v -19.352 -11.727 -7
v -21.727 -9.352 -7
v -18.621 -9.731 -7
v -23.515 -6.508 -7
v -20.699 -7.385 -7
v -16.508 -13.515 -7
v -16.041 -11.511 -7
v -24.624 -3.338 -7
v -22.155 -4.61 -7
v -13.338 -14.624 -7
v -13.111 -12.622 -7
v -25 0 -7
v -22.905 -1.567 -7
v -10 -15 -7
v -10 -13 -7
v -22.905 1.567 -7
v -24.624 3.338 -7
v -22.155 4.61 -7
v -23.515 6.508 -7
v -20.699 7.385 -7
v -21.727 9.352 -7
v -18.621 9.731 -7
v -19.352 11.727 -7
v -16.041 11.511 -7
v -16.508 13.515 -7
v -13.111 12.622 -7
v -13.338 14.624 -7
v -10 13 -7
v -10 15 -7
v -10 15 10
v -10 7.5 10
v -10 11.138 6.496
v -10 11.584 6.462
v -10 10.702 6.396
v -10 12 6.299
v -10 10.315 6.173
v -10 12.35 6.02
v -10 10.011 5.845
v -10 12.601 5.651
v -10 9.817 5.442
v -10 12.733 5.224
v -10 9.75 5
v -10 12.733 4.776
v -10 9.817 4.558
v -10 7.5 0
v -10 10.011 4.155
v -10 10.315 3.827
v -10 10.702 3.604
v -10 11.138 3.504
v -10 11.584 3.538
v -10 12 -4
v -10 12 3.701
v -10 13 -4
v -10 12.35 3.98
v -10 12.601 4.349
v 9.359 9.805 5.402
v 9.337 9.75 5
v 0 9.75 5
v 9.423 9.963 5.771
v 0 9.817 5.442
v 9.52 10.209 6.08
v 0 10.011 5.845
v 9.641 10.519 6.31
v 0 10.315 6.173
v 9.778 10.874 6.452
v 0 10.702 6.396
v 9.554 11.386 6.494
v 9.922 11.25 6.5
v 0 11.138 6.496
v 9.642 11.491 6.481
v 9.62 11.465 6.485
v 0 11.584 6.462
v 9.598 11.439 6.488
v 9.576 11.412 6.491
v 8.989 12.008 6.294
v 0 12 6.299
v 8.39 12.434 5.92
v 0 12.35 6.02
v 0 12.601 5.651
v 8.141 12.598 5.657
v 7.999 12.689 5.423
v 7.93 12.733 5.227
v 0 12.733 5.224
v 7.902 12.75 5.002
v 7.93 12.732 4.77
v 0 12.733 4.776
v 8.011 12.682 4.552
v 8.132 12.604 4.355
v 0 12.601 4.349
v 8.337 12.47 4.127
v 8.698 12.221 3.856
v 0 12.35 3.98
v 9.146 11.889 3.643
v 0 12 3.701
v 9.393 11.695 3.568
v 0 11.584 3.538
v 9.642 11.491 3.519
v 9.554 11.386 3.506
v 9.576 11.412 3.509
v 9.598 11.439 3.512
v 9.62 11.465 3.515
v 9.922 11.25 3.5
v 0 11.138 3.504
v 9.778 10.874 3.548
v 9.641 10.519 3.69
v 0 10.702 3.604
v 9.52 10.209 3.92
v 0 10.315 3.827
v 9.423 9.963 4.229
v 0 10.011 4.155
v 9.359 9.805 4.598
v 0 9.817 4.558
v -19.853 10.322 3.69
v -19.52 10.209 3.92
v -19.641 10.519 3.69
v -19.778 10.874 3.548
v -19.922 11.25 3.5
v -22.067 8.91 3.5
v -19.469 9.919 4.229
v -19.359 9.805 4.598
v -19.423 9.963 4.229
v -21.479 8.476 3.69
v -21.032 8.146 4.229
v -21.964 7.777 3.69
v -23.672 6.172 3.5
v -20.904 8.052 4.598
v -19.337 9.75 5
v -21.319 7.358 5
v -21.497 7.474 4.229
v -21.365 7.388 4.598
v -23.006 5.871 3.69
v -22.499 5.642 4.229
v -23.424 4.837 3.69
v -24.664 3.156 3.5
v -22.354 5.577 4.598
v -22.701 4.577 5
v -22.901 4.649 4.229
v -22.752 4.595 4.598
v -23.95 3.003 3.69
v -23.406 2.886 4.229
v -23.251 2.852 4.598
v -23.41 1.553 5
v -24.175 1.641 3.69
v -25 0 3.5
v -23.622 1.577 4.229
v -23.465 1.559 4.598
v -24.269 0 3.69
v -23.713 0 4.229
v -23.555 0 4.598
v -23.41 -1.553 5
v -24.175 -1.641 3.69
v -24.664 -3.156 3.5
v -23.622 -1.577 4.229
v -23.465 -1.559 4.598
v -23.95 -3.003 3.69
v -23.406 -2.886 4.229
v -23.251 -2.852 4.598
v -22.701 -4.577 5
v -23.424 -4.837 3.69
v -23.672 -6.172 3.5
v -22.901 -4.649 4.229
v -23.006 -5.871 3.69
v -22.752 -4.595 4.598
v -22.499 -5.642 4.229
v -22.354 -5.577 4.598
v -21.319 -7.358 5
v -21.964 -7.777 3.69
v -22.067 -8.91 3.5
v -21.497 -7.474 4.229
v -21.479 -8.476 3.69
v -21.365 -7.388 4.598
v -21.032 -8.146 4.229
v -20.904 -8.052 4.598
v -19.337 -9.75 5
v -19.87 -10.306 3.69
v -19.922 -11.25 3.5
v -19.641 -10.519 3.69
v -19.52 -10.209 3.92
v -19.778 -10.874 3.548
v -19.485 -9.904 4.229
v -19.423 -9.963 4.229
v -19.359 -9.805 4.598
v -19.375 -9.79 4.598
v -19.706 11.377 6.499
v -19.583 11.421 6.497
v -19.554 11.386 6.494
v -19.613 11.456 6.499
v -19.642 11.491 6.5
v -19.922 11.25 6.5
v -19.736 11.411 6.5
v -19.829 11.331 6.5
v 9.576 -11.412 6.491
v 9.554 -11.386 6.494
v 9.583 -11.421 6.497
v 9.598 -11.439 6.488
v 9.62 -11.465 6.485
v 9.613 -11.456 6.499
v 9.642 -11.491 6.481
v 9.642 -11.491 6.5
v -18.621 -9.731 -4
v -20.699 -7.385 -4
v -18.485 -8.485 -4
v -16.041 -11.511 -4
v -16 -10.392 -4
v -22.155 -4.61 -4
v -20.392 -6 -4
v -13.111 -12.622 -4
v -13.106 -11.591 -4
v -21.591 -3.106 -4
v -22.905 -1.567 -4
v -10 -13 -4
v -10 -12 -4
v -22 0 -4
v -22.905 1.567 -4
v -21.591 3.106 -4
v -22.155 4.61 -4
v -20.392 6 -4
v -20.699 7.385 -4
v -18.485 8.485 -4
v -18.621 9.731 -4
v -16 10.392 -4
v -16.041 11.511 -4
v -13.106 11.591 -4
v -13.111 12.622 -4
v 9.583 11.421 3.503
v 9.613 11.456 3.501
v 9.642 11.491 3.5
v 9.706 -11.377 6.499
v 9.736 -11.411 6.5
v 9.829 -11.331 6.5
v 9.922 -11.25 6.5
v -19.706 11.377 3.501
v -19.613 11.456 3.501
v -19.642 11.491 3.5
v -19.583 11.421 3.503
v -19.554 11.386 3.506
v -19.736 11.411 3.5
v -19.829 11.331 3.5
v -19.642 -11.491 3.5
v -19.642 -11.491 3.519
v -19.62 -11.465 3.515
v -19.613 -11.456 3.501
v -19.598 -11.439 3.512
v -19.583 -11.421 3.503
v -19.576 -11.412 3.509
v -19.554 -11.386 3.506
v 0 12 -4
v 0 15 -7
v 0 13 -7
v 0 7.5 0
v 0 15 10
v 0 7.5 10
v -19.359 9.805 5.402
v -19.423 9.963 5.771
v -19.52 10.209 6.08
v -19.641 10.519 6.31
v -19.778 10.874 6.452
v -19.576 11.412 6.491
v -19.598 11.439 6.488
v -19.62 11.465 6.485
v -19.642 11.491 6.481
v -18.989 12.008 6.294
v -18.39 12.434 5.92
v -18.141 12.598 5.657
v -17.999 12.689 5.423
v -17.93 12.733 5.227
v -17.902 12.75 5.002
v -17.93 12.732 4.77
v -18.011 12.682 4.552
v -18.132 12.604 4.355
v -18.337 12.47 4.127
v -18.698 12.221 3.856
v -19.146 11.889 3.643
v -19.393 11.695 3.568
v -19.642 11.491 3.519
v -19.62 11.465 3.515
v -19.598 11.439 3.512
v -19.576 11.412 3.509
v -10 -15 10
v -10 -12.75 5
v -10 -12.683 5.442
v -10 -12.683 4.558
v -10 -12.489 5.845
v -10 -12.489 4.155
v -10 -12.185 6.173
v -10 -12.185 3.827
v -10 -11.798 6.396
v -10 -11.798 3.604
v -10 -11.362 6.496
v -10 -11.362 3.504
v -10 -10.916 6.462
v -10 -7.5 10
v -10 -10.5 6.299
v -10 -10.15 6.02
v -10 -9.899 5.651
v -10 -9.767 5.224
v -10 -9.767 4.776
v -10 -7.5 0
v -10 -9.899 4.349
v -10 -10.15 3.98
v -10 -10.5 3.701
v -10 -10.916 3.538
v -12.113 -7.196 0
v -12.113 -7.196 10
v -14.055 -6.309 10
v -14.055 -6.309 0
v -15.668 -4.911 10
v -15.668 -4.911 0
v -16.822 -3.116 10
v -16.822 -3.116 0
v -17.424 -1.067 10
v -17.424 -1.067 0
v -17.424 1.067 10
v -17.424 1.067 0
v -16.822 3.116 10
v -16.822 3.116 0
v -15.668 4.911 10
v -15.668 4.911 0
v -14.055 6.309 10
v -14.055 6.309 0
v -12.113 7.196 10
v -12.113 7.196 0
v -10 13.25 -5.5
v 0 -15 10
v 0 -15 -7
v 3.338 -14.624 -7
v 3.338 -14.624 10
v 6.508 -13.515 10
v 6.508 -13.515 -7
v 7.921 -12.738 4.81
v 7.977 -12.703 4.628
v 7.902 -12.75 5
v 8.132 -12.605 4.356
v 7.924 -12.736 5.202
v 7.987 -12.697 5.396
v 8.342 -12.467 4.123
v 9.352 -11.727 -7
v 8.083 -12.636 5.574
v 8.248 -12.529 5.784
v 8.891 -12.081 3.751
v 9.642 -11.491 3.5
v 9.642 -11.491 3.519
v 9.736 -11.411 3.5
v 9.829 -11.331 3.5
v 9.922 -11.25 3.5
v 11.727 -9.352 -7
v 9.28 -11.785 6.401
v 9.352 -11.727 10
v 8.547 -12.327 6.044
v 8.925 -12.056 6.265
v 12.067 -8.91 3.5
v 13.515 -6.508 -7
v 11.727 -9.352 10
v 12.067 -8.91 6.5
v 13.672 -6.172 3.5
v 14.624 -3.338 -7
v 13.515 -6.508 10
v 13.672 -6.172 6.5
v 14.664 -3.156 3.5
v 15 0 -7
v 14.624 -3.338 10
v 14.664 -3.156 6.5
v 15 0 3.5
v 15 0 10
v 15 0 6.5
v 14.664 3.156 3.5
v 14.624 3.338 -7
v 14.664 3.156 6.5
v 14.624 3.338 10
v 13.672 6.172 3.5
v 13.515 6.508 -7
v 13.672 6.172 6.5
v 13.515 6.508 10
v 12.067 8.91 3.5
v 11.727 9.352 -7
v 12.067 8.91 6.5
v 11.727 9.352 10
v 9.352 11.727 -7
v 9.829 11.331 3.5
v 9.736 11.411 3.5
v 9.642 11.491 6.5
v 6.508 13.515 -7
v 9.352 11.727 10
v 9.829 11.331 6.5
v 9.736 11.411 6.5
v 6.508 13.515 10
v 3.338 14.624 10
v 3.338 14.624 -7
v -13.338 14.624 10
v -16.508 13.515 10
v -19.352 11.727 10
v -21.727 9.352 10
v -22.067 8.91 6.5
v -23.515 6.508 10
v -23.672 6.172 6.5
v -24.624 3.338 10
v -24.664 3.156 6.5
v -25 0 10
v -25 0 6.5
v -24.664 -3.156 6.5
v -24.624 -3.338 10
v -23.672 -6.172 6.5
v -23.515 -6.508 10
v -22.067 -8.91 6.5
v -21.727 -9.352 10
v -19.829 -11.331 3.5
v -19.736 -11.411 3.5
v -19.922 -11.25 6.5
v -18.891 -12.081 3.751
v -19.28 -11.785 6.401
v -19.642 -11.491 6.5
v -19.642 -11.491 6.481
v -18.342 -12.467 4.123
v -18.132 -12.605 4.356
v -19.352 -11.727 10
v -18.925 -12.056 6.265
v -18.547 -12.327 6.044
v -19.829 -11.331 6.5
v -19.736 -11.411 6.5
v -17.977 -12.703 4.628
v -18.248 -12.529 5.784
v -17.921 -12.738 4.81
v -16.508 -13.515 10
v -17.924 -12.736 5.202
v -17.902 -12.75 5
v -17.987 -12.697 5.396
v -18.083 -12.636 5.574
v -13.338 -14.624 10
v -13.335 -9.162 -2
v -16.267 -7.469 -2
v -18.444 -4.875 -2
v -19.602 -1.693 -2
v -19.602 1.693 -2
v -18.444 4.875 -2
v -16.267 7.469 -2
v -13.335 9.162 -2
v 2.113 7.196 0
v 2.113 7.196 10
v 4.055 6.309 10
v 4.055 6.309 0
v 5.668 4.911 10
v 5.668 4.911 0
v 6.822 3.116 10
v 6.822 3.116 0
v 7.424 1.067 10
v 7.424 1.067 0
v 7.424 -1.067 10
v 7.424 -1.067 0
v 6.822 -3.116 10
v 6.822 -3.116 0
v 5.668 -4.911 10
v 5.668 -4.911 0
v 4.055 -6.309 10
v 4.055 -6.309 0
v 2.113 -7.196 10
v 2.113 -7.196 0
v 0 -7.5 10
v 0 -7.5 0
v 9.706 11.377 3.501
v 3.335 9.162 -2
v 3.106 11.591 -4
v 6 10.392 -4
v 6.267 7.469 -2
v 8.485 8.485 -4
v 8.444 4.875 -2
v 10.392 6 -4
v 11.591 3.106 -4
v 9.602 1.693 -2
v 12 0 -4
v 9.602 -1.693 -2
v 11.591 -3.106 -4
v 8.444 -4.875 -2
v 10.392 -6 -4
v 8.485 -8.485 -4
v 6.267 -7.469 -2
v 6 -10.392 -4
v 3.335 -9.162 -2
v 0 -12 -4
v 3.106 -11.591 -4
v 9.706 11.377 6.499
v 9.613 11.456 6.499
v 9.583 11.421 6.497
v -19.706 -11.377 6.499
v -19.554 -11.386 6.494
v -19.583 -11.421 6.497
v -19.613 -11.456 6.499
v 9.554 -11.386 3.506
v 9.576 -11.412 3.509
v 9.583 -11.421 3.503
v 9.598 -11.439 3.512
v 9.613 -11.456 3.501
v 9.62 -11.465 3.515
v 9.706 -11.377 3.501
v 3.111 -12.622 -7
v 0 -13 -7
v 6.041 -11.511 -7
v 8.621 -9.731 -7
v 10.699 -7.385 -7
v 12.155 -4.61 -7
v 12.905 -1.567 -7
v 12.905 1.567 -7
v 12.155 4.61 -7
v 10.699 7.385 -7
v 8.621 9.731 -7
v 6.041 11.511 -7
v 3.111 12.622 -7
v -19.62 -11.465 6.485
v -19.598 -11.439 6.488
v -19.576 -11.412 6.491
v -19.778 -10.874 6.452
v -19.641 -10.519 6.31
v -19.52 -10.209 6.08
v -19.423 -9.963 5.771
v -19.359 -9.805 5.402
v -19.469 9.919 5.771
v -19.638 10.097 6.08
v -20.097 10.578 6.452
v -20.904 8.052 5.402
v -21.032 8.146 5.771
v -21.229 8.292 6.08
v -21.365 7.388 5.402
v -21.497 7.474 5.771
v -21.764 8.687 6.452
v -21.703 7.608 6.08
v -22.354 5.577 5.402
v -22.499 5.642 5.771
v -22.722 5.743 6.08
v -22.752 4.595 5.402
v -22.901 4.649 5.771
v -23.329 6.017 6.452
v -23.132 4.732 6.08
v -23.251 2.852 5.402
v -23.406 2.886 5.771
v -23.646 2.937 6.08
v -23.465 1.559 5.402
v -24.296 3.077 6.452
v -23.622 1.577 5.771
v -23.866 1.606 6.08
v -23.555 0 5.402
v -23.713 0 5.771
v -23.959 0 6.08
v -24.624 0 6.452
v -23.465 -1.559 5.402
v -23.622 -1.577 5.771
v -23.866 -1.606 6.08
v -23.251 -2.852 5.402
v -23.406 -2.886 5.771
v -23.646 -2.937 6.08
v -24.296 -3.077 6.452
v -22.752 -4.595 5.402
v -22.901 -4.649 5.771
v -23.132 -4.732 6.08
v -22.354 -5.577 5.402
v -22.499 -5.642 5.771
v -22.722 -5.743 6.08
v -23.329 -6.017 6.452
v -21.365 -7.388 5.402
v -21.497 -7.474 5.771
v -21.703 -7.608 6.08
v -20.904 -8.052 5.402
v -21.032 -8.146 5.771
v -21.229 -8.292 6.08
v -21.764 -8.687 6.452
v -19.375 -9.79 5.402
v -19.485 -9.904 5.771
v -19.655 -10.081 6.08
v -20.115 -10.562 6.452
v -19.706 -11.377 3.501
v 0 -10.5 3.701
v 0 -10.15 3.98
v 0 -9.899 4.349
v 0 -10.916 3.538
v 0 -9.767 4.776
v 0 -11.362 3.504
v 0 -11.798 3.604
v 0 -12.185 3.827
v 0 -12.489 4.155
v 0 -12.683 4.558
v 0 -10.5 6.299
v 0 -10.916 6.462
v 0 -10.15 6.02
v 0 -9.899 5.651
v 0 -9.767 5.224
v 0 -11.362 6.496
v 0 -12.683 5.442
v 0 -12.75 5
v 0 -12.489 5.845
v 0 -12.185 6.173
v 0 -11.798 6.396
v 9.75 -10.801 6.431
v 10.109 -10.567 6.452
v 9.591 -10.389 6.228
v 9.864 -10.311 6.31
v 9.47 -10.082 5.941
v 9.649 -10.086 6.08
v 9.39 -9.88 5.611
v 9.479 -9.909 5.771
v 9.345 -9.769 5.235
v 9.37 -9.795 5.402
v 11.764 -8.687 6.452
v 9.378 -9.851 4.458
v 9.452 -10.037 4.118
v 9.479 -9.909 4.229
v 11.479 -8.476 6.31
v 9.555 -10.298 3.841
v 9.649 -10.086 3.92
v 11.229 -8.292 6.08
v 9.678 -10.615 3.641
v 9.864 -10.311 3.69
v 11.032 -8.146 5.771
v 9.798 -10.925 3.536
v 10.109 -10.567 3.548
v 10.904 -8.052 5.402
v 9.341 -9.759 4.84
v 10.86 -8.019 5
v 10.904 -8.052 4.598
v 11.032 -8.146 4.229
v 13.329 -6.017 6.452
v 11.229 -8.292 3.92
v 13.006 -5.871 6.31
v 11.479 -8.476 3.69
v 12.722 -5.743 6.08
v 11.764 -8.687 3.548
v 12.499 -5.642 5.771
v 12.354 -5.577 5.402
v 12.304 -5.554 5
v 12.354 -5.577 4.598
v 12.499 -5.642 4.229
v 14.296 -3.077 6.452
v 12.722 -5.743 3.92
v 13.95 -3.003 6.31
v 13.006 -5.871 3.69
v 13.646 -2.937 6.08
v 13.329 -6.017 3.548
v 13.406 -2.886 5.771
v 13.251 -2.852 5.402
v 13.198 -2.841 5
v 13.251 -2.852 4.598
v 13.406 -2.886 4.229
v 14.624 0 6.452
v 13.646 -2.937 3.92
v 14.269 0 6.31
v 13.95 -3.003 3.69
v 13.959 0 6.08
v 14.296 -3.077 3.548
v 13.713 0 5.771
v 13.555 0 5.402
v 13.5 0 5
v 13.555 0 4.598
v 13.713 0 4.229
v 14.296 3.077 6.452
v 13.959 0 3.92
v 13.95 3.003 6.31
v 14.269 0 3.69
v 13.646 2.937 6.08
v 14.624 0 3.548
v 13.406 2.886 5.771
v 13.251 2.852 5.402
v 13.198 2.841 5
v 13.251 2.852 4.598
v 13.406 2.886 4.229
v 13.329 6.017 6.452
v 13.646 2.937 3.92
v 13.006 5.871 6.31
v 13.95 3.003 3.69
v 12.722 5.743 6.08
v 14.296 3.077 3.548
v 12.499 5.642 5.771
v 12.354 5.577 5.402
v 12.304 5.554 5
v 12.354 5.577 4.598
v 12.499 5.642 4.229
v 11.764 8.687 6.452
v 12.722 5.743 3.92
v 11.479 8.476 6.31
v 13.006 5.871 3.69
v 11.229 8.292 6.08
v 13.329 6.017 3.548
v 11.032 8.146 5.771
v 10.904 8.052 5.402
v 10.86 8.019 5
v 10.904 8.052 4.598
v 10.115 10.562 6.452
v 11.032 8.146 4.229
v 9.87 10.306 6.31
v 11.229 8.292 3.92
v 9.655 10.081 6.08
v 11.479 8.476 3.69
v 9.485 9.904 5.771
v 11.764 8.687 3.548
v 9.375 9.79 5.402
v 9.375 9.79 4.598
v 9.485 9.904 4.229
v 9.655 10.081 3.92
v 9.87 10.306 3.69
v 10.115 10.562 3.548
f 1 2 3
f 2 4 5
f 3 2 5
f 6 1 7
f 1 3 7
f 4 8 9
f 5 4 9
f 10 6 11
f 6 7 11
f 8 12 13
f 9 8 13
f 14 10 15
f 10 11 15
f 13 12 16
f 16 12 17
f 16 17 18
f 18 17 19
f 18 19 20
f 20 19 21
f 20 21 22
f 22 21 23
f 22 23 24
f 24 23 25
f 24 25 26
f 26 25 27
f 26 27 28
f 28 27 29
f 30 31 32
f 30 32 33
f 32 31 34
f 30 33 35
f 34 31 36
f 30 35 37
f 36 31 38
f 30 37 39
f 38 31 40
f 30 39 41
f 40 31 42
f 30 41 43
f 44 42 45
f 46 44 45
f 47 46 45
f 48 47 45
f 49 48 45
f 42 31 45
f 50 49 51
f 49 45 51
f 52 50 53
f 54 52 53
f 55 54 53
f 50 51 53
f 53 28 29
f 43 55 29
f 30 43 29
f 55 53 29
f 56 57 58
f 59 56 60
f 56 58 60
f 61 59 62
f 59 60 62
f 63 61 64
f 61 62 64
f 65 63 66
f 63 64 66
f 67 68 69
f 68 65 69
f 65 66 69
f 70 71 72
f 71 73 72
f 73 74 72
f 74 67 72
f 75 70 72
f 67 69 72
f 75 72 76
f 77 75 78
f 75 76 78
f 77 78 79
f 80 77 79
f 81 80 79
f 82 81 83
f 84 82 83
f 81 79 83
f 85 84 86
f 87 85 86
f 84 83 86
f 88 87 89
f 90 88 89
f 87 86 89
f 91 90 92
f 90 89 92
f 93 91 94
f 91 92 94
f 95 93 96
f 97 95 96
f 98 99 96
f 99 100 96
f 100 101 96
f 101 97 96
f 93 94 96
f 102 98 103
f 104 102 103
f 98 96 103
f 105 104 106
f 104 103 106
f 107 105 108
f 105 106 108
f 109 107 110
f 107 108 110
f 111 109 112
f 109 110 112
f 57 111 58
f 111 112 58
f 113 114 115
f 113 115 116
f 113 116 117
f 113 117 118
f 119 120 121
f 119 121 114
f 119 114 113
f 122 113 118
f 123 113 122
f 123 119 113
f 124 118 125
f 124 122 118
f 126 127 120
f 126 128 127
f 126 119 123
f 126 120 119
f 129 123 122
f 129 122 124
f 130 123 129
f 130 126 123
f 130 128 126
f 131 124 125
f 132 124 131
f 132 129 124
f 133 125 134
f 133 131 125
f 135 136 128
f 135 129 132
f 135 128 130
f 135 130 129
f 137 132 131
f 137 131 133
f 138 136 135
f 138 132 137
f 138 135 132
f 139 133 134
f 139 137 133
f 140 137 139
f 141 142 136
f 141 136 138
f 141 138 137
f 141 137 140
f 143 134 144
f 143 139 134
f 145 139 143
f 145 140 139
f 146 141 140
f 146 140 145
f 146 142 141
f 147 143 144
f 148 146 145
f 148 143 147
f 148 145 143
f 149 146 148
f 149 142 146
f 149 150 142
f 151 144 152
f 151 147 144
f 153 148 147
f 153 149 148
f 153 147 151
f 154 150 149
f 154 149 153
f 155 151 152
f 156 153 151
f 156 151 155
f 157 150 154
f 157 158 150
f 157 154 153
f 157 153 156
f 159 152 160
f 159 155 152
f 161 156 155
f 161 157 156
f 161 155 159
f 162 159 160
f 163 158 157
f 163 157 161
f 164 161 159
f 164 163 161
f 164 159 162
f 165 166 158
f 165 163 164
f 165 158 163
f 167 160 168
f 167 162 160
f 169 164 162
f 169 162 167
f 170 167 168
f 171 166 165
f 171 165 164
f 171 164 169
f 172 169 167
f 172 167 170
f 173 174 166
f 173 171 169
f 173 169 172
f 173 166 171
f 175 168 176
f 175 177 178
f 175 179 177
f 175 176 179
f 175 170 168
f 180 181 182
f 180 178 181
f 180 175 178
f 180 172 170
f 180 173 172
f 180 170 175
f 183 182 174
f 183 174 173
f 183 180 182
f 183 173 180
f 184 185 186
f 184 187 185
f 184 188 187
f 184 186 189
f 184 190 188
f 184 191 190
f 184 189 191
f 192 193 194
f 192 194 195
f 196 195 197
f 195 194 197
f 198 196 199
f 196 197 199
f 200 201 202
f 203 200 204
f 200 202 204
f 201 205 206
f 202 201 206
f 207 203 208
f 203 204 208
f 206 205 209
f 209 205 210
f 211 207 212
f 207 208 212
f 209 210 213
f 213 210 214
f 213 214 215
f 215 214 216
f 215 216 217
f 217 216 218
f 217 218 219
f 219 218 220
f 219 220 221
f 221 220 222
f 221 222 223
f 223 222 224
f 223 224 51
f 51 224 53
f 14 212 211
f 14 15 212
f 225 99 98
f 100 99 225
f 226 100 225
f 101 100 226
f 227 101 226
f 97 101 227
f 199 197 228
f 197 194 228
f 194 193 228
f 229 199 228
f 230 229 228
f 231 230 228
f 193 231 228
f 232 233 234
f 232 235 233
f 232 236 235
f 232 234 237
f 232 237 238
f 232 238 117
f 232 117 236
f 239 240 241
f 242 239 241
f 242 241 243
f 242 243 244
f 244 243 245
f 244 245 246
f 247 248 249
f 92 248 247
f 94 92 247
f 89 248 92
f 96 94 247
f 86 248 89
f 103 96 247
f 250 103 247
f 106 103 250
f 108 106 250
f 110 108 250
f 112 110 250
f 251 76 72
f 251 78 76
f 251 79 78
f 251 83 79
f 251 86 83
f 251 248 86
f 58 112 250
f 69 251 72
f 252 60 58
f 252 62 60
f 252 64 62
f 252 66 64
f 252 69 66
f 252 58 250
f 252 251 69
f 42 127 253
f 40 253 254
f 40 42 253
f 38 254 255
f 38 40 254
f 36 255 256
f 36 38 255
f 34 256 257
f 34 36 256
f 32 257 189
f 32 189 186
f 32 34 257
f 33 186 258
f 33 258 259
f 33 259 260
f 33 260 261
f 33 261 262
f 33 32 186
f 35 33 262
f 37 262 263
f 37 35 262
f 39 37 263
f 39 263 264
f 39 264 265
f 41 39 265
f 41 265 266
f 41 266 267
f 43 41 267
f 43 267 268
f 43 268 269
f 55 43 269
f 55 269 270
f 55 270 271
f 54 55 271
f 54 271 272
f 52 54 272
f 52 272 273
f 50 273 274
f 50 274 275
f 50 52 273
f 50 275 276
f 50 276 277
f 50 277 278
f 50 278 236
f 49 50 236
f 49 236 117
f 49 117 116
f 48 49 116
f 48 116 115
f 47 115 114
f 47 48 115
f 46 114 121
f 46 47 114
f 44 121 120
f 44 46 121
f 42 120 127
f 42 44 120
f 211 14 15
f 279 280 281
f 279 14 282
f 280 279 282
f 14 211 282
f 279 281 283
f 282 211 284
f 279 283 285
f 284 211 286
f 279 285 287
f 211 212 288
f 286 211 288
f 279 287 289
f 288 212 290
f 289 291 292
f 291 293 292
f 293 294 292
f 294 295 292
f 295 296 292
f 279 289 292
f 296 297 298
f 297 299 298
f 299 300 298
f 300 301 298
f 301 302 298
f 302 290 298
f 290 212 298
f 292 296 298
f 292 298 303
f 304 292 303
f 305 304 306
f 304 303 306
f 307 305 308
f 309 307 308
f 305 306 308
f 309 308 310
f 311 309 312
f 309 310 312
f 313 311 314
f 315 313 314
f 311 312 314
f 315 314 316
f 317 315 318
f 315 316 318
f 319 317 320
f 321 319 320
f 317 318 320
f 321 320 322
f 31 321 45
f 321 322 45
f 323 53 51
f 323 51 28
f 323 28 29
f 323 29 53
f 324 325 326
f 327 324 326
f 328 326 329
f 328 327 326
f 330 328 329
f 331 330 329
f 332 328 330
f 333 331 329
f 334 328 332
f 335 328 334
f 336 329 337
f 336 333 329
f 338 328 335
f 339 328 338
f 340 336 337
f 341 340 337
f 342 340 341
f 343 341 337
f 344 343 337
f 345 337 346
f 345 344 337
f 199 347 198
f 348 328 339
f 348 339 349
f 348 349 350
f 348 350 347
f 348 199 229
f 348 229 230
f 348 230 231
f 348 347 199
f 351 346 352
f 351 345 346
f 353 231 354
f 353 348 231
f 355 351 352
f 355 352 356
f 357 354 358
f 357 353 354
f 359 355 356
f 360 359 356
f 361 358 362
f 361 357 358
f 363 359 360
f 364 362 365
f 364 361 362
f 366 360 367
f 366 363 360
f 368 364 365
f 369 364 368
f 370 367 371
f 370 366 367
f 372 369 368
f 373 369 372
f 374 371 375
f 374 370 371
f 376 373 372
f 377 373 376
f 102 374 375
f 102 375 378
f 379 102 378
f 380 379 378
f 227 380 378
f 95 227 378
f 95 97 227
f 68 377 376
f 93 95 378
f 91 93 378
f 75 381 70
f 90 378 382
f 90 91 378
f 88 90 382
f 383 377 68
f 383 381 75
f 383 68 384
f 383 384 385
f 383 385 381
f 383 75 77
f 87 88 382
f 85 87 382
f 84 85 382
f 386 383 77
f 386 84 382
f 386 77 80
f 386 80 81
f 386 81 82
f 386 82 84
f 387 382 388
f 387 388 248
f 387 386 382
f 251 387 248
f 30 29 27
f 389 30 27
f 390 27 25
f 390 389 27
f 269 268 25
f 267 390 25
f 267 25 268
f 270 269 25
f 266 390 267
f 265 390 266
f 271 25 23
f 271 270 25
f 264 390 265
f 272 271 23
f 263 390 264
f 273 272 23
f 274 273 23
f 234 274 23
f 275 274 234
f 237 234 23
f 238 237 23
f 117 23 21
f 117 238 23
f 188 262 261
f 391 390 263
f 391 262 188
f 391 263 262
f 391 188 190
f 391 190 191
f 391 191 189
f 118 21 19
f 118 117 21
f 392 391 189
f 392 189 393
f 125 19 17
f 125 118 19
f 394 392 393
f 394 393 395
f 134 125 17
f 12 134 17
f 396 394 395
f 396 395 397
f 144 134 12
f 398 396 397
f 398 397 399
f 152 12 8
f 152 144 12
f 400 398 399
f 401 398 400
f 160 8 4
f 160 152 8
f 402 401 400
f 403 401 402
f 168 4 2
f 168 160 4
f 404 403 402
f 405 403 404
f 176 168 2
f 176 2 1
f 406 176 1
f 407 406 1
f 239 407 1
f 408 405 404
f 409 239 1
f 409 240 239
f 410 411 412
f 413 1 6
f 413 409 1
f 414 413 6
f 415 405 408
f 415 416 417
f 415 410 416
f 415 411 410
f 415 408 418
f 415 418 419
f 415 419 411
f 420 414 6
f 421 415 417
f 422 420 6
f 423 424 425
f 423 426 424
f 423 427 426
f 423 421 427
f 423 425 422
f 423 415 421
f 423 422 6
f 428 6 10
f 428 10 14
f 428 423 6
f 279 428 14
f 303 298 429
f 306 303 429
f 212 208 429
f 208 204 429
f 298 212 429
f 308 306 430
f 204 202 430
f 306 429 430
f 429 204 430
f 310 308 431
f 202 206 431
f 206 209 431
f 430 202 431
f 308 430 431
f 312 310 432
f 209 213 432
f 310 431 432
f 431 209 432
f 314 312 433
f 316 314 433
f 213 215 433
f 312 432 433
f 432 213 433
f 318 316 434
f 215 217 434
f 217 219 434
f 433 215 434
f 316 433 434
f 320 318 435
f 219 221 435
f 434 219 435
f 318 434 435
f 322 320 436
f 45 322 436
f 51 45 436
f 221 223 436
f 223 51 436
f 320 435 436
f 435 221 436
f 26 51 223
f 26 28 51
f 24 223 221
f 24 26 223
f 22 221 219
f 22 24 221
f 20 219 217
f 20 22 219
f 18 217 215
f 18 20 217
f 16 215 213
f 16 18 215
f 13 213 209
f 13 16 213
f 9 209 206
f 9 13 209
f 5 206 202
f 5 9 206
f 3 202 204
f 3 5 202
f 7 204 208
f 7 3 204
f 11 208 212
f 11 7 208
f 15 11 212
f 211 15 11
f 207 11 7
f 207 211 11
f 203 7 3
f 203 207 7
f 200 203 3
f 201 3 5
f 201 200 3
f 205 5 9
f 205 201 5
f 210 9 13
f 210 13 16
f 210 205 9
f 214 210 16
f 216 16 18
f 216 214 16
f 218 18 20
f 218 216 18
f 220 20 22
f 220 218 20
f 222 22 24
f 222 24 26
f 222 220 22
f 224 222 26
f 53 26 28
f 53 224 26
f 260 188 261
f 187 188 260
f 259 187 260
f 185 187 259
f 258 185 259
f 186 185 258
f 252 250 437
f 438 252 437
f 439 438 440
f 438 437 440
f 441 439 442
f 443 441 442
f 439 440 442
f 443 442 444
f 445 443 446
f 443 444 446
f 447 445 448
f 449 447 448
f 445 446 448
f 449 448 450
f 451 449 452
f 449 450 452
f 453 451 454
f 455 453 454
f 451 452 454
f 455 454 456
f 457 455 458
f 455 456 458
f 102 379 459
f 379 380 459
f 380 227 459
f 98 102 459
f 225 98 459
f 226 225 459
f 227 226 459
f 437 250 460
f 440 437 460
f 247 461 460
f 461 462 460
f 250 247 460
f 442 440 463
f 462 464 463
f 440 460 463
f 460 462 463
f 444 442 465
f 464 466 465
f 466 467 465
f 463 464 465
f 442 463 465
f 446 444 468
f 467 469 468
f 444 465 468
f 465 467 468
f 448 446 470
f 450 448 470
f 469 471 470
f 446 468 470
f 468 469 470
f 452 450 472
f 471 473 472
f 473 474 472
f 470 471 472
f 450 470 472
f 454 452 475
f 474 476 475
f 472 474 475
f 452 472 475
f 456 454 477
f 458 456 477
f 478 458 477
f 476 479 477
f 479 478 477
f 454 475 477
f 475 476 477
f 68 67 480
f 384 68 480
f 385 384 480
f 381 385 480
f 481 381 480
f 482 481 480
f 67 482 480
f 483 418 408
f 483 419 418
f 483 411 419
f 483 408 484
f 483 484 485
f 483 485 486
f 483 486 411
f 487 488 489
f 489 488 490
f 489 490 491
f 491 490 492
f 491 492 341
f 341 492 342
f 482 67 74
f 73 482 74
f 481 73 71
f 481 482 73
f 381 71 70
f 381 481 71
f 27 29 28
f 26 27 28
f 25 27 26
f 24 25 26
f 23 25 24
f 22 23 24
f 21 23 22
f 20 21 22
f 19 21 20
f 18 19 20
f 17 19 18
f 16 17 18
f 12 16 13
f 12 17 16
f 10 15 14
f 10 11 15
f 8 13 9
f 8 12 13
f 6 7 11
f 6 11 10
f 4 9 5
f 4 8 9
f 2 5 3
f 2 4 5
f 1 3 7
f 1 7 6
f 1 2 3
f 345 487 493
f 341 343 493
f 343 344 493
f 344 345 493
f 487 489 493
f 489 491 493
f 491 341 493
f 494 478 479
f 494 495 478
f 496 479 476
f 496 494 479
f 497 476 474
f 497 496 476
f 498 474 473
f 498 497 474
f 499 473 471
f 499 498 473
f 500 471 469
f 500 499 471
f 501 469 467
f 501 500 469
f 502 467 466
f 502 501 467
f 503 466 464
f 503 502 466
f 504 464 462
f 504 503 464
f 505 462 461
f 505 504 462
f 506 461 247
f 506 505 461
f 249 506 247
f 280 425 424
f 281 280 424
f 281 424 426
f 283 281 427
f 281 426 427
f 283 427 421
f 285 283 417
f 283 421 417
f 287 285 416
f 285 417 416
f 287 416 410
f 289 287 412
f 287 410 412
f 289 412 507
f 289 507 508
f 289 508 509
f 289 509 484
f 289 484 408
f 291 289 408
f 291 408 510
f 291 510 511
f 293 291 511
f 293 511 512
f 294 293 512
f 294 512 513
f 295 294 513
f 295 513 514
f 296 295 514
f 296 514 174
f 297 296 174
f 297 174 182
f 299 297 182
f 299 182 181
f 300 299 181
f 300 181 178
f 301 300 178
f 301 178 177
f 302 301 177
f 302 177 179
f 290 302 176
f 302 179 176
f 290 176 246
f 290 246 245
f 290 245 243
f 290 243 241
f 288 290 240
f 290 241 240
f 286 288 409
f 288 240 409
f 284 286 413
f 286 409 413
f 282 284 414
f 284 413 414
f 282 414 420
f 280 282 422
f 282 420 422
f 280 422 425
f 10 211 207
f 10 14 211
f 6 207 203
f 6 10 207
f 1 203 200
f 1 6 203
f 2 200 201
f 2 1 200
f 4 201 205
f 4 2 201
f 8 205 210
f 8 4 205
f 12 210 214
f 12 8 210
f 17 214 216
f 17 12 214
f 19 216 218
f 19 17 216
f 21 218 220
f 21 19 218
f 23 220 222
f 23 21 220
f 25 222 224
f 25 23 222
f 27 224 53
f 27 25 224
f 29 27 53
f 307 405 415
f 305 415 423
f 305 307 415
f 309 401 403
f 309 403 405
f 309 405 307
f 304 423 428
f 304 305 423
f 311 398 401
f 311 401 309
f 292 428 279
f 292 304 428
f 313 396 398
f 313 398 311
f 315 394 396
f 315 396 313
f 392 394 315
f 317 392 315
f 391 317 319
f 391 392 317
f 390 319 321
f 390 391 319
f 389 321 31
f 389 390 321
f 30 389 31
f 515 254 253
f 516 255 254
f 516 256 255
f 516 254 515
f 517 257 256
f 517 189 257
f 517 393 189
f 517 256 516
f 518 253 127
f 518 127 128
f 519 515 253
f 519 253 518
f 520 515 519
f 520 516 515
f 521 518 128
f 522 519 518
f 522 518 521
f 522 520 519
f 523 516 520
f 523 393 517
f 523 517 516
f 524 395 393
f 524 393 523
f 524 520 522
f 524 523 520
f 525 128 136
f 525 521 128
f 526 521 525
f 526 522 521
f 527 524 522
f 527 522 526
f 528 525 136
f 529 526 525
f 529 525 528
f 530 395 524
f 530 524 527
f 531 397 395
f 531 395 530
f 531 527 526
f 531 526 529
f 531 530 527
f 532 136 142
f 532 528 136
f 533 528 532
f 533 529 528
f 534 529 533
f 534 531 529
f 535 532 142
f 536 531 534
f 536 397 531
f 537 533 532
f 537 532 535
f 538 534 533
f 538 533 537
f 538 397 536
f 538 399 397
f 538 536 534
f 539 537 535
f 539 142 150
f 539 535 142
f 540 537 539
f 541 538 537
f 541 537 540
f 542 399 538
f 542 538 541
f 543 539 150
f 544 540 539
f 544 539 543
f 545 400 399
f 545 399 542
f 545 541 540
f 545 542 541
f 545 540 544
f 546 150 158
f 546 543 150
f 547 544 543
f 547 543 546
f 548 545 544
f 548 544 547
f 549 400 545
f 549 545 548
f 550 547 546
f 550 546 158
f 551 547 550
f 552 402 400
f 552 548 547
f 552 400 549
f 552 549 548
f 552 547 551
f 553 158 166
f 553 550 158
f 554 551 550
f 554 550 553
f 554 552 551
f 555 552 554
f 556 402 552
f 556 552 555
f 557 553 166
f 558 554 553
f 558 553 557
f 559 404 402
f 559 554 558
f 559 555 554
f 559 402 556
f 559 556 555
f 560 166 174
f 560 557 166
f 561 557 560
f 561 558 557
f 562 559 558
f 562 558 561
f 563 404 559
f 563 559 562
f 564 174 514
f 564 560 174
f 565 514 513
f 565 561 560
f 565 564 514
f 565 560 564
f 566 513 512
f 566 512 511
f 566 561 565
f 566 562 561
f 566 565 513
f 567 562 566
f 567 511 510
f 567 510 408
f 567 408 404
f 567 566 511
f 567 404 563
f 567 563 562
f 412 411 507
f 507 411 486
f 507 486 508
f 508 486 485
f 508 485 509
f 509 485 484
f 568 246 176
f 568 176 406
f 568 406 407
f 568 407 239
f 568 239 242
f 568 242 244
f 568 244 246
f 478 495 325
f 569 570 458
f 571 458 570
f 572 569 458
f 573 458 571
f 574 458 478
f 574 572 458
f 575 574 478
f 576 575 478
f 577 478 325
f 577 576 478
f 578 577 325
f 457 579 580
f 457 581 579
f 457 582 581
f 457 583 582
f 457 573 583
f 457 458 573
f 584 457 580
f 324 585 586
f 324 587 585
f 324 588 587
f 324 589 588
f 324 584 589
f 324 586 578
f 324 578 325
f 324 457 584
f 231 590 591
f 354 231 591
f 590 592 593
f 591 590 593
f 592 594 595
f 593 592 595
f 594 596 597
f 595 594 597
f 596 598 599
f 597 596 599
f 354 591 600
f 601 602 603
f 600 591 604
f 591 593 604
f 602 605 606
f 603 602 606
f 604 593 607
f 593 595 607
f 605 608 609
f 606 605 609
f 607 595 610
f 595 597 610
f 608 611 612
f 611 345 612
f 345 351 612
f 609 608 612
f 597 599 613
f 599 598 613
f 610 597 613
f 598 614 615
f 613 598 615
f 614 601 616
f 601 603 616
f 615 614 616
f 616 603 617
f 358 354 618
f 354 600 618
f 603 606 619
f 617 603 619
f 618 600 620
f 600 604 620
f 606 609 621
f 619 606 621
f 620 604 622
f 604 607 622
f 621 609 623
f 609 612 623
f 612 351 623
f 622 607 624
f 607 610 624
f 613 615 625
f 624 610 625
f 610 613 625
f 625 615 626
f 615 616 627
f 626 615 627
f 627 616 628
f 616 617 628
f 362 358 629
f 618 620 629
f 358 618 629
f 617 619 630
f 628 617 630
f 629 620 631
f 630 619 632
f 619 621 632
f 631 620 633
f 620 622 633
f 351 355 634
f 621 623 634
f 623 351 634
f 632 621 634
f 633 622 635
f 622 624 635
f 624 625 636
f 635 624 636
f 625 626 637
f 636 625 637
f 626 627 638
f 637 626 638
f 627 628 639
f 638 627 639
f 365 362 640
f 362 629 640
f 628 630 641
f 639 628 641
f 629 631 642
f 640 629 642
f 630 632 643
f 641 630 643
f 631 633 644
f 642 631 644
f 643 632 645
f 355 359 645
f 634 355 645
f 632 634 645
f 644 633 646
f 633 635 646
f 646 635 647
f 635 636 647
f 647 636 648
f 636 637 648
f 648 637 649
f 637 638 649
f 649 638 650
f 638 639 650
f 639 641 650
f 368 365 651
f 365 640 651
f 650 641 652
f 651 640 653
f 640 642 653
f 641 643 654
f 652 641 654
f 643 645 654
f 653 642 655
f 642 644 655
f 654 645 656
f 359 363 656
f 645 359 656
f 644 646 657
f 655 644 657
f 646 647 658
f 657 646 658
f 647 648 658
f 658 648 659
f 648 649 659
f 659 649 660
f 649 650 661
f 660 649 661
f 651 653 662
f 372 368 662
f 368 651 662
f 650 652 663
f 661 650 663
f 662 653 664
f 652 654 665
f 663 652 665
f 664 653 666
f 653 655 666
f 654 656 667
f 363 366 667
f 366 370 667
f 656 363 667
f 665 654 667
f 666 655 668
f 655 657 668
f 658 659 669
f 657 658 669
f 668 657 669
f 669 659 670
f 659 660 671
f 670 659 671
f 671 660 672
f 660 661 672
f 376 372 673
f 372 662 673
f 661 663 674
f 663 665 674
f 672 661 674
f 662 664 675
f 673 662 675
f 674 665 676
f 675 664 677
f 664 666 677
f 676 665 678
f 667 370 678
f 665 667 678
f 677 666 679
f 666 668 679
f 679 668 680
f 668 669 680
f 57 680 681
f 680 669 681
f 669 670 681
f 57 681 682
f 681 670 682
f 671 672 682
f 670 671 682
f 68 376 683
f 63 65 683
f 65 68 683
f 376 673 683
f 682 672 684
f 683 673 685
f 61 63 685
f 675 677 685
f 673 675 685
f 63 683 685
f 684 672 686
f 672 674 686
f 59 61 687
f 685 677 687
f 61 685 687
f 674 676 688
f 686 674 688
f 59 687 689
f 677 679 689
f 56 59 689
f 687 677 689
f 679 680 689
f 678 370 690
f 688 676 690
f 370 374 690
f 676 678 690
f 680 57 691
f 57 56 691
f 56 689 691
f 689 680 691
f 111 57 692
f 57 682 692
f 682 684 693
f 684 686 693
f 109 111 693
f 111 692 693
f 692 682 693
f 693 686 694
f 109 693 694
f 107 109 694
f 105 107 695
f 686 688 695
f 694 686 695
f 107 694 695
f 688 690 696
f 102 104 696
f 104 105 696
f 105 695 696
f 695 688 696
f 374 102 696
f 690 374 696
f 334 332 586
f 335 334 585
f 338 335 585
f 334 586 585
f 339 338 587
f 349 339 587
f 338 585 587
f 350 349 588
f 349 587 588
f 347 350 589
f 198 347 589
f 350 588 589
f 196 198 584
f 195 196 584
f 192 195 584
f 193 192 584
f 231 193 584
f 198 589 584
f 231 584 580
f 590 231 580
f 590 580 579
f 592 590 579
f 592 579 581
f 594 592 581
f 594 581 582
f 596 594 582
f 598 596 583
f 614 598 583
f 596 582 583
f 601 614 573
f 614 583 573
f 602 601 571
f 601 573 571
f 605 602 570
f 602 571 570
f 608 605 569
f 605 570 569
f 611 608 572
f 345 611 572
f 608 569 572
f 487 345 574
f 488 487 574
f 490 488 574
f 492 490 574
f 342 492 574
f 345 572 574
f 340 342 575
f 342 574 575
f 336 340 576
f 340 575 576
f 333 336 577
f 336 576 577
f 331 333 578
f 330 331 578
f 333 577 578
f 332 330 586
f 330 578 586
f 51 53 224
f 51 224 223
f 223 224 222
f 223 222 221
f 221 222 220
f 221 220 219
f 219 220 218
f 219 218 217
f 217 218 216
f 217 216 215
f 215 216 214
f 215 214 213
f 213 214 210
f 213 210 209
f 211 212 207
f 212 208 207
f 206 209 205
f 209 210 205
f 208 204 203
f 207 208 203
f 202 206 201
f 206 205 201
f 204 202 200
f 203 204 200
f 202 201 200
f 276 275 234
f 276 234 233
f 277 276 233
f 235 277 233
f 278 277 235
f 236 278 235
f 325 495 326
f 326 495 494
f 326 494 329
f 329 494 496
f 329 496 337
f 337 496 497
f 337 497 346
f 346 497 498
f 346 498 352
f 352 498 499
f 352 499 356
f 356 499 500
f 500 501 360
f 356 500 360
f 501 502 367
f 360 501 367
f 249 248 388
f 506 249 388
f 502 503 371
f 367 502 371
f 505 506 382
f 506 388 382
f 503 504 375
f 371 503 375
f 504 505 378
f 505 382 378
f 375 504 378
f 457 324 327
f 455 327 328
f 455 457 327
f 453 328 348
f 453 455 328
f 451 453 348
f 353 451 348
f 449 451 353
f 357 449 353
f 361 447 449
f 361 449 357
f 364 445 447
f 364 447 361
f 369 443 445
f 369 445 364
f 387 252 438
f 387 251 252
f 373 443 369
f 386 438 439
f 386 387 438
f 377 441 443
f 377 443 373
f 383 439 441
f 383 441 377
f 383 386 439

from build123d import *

# Parameters (mm, degrees)
F1_DEPTH       = 10
F3_R           = 1.5
F4_DEPTH       = 25
F5_ANGLE_START = 40
F5_ANGLE       = 100
F7_ANGLE_START = 220
F7_ANGLE       = 100
F8_DEPTH       = 7
F9_DEPTH       = 4


with BuildPart() as f1:
    # F0 (on Top) → F1 (new body)
    with BuildSketch(Plane.XY):
        with BuildLine():
            Line((-10, 12), (-10, 13))
            ThreePointArc((-10, 13), (-23, 0), (-10, -13))
            Line((-10, -13), (-10, -12))
            ThreePointArc((-10, -12), (-22, 0), (-10, 12))
        make_face()
        with BuildLine():
            Line((-10, 7.5), (-10, 12))
            ThreePointArc((-10, 12), (-22, 0), (-10, -12))
            Line((-10, -12), (-10, -7.5))
            ThreePointArc((-10, -7.5), (-17.5, 0), (-10, 7.5))
        make_face()
        with BuildLine():
            Line((-10, 13), (-10, 15))
            ThreePointArc((-10, 15), (-25, 0), (-10, -15))
            Line((-10, -15), (-10, -13))
            ThreePointArc((-10, -13), (-23, 0), (-10, 13))
        make_face()
    extrude(amount=F1_DEPTH)


with BuildPart() as f1b:
    # F0 (on Top) → F1, piece 2 (new body)
    with BuildSketch(Plane.XY):
        with BuildLine():
            ThreePointArc((0, -13), (13, 0), (0, 13))
            Line((0, 13), (0, 12))
            ThreePointArc((0, 12), (12, 0), (0, -12))
            Line((0, -12), (0, -13))
        make_face()
        with BuildLine():
            ThreePointArc((0, -12), (12, 0), (0, 12))
            Line((0, 12), (0, 7.5))
            ThreePointArc((0, 7.5), (7.5, 0), (0, -7.5))
            Line((0, -7.5), (0, -12))
        make_face()
        with BuildLine():
            ThreePointArc((0, -15), (15, 0), (0, 15))
            Line((0, 15), (0, 13))
            ThreePointArc((0, 13), (13, 0), (0, -13))
            Line((0, -13), (0, -15))
        make_face()
    extrude(amount=F1_DEPTH)


with BuildPart() as f4_tool:
    # F3 (on face) → F4 (new body, symmetric)
    with BuildSketch(Plane(origin=(0, 0, 0), x_dir=(0, -1, 0), z_dir=(-1, 0, 0))):
        with Locations((-11.25, 5)):
            Circle(F3_R)
        with Locations((11.25, 5)):
            Circle(F3_R)
    extrude(amount=F4_DEPTH, both=True)


with BuildPart() as f1_1:
    add(f1.part)

    # F4: cut by f4_tool
    add(f4_tool.part, mode=Mode.SUBTRACT)

    # F6 (on face) → F7 (revolve, cut)
    with BuildSketch(Plane.YZ.offset(-10), mode=Mode.PRIVATE) as f7_sk:
        with BuildLine():
            ThreePointArc((-15, 3.5), (-13.9393398282, 3.9393398282), (-13.5, 5))
            ThreePointArc((-13.5, 5), (-13.9393398282, 6.0606601718), (-15, 6.5))
            Line((-15, 6.5), (-15, 3.5))
        make_face()
    revolve(f7_sk.sketch.rotate(Axis((-10, 0, 6.8141282536), (0, 0, 1)), F7_ANGLE_START), axis=Axis((-10, 0, 6.8141282536), (0, 0, 1)), revolution_arc=F7_ANGLE, mode=Mode.SUBTRACT)

    # F0 (on Top) → F8, piece 2 (join)
    with BuildSketch(Plane.XY):
        with BuildLine():
            Line((-10, 13), (-10, 15))
            ThreePointArc((-10, 15), (-25, 0), (-10, -15))
            Line((-10, -15), (-10, -13))
            ThreePointArc((-10, -13), (-23, 0), (-10, 13))
        make_face()
    extrude(amount=-F8_DEPTH)

    # F0 (on Top) → F9, piece 2 (join)
    with BuildSketch(Plane.XY):
        with BuildLine():
            Line((-10, 12), (-10, 13))
            ThreePointArc((-10, 13), (-23, 0), (-10, -13))
            Line((-10, -13), (-10, -12))
            ThreePointArc((-10, -12), (-22, 0), (-10, 12))
        make_face()
    extrude(amount=-F9_DEPTH)

    # F0 (on Top) → F11 section 0
    with BuildSketch(Plane.XY):
        with BuildLine():
            Line((-10, 7.5), (-10, 12))
            ThreePointArc((-10, 12), (-22, 0), (-10, -12))
            Line((-10, -12), (-10, -7.5))
            ThreePointArc((-10, -7.5), (-17.5, 0), (-10, 7.5))
        make_face()
    # F9_face (on face) → F11 section 1
    with BuildSketch(Plane(origin=(7.9619912864, 0, -4), x_dir=(1, 0, 0), z_dir=(0, 0, -1))):
        with BuildLine():
            Line((-17.9619912864, 12), (-17.9619912864, 13))
            ThreePointArc((-17.9619912864, 13), (-30.9619912864, 0), (-17.9619912864, -13))
            Line((-17.9619912864, -13), (-17.9619912864, -12))
            ThreePointArc((-17.9619912864, -12), (-29.9619912864, 0), (-17.9619912864, 12))
        make_face()
    loft()


with BuildPart() as f1b_1:
    add(f1b.part)

    # F4: cut by f4_tool
    add(f4_tool.part, mode=Mode.SUBTRACT)

    # F3 (on face) → F5 (revolve, cut)
    with BuildSketch(Plane(origin=(0, 0, 0), x_dir=(0, -1, 0), z_dir=(-1, 0, 0)), mode=Mode.PRIVATE) as f5_sk:
        with BuildLine():
            Line((15, 3.5), (15, 6.5))
            ThreePointArc((15, 6.5), (13.5, 5), (15, 3.5))
        make_face()
    revolve(f5_sk.sketch.rotate(Axis((0, 0, 4.2424267518), (0, 0, 1)), F5_ANGLE_START), axis=Axis((0, 0, 4.2424267518), (0, 0, 1)), revolution_arc=F5_ANGLE, mode=Mode.SUBTRACT)

    # F0 (on Top) → F8 (join)
    with BuildSketch(Plane.XY):
        with BuildLine():
            ThreePointArc((0, -15), (15, 0), (0, 15))
            Line((0, 15), (0, 13))
            ThreePointArc((0, 13), (13, 0), (0, -13))
            Line((0, -13), (0, -15))
        make_face()
    extrude(amount=-F8_DEPTH)

    # F0 (on Top) → F9 (join)
    with BuildSketch(Plane.XY):
        with BuildLine():
            ThreePointArc((0, -13), (13, 0), (0, 13))
            Line((0, 13), (0, 12))
            ThreePointArc((0, 12), (12, 0), (0, -12))
            Line((0, -12), (0, -13))
        make_face()
    extrude(amount=-F9_DEPTH)

    # F0 (on Top) → F10 section 0
    with BuildSketch(Plane.XY):
        with BuildLine():
            ThreePointArc((0, -12), (12, 0), (0, 12))
            Line((0, 12), (0, 7.5))
            ThreePointArc((0, 7.5), (7.5, 0), (0, -7.5))
            Line((0, -7.5), (0, -12))
        make_face()
    # F9_face (on face) → F10 section 1
    with BuildSketch(Plane(origin=(7.9619912864, 0, -4), x_dir=(1, 0, 0), z_dir=(0, 0, -1))):
        with BuildLine():
            Line((-7.9619912864, -12), (-7.9619912864, -13))
            ThreePointArc((-7.9619912864, -13), (5.0380087136, 0), (-7.9619912864, 13))
            Line((-7.9619912864, 13), (-7.9619912864, 12))
            ThreePointArc((-7.9619912864, 12), (4.0380087136, 0), (-7.9619912864, -12))
        make_face()
    loft()

    # F9_face (on face) → F12 section 0
    with BuildSketch(Plane(origin=(7.9619912864, 0, -4), x_dir=(1, 0, 0), z_dir=(0, 0, -1))):
        with BuildLine():
            Line((-7.9619912864, -12), (-7.9619912864, -13))
            ThreePointArc((-7.9619912864, -13), (5.0380087136, 0), (-7.9619912864, 13))
            Line((-7.9619912864, 13), (-7.9619912864, 12))
            ThreePointArc((-7.9619912864, 12), (4.0380087136, 0), (-7.9619912864, -12))
        make_face()
    # F8_face (on face) → F12 section 1
    with BuildSketch(Plane(origin=(8.9278344268, 0, -7), x_dir=(1, 0, 0), z_dir=(0, 0, -1))):
        with BuildLine():
            Line((-8.9278344268, -13), (-8.9278344268, -15))
            ThreePointArc((-8.9278344268, -15), (6.0721655732, 0), (-8.9278344268, 15))
            Line((-8.9278344268, 15), (-8.9278344268, 13))
            ThreePointArc((-8.9278344268, 13), (4.0721655732, 0), (-8.9278344268, -13))
        make_face()
    loft()


with BuildPart() as f13:
    # F9_face (on face) → F13 section 0
    with BuildSketch(Plane(origin=(7.9619912864, 0, -4), x_dir=(1, 0, 0), z_dir=(0, 0, -1))):
        with BuildLine():
            Line((-17.9619912864, 12), (-17.9619912864, 13))
            ThreePointArc((-17.9619912864, 13), (-30.9619912864, 0), (-17.9619912864, -13))
            Line((-17.9619912864, -13), (-17.9619912864, -12))
            ThreePointArc((-17.9619912864, -12), (-29.9619912864, 0), (-17.9619912864, 12))
        make_face()
    # F8_face (on face) → F13 section 1
    with BuildSketch(Plane(origin=(8.9278344268, 0, -7), x_dir=(1, 0, 0), z_dir=(0, 0, -1))):
        with BuildLine():
            Line((-18.9278344268, 13), (-18.9278344268, 15))
            ThreePointArc((-18.9278344268, 15), (-33.9278344268, 0), (-18.9278344268, -15))
            Line((-18.9278344268, -15), (-18.9278344268, -13))
            ThreePointArc((-18.9278344268, -13), (-31.9278344268, 0), (-18.9278344268, 13))
        make_face()
    loft()


solid = Compound([f1_1.part, f1b_1.part, f13.part])
